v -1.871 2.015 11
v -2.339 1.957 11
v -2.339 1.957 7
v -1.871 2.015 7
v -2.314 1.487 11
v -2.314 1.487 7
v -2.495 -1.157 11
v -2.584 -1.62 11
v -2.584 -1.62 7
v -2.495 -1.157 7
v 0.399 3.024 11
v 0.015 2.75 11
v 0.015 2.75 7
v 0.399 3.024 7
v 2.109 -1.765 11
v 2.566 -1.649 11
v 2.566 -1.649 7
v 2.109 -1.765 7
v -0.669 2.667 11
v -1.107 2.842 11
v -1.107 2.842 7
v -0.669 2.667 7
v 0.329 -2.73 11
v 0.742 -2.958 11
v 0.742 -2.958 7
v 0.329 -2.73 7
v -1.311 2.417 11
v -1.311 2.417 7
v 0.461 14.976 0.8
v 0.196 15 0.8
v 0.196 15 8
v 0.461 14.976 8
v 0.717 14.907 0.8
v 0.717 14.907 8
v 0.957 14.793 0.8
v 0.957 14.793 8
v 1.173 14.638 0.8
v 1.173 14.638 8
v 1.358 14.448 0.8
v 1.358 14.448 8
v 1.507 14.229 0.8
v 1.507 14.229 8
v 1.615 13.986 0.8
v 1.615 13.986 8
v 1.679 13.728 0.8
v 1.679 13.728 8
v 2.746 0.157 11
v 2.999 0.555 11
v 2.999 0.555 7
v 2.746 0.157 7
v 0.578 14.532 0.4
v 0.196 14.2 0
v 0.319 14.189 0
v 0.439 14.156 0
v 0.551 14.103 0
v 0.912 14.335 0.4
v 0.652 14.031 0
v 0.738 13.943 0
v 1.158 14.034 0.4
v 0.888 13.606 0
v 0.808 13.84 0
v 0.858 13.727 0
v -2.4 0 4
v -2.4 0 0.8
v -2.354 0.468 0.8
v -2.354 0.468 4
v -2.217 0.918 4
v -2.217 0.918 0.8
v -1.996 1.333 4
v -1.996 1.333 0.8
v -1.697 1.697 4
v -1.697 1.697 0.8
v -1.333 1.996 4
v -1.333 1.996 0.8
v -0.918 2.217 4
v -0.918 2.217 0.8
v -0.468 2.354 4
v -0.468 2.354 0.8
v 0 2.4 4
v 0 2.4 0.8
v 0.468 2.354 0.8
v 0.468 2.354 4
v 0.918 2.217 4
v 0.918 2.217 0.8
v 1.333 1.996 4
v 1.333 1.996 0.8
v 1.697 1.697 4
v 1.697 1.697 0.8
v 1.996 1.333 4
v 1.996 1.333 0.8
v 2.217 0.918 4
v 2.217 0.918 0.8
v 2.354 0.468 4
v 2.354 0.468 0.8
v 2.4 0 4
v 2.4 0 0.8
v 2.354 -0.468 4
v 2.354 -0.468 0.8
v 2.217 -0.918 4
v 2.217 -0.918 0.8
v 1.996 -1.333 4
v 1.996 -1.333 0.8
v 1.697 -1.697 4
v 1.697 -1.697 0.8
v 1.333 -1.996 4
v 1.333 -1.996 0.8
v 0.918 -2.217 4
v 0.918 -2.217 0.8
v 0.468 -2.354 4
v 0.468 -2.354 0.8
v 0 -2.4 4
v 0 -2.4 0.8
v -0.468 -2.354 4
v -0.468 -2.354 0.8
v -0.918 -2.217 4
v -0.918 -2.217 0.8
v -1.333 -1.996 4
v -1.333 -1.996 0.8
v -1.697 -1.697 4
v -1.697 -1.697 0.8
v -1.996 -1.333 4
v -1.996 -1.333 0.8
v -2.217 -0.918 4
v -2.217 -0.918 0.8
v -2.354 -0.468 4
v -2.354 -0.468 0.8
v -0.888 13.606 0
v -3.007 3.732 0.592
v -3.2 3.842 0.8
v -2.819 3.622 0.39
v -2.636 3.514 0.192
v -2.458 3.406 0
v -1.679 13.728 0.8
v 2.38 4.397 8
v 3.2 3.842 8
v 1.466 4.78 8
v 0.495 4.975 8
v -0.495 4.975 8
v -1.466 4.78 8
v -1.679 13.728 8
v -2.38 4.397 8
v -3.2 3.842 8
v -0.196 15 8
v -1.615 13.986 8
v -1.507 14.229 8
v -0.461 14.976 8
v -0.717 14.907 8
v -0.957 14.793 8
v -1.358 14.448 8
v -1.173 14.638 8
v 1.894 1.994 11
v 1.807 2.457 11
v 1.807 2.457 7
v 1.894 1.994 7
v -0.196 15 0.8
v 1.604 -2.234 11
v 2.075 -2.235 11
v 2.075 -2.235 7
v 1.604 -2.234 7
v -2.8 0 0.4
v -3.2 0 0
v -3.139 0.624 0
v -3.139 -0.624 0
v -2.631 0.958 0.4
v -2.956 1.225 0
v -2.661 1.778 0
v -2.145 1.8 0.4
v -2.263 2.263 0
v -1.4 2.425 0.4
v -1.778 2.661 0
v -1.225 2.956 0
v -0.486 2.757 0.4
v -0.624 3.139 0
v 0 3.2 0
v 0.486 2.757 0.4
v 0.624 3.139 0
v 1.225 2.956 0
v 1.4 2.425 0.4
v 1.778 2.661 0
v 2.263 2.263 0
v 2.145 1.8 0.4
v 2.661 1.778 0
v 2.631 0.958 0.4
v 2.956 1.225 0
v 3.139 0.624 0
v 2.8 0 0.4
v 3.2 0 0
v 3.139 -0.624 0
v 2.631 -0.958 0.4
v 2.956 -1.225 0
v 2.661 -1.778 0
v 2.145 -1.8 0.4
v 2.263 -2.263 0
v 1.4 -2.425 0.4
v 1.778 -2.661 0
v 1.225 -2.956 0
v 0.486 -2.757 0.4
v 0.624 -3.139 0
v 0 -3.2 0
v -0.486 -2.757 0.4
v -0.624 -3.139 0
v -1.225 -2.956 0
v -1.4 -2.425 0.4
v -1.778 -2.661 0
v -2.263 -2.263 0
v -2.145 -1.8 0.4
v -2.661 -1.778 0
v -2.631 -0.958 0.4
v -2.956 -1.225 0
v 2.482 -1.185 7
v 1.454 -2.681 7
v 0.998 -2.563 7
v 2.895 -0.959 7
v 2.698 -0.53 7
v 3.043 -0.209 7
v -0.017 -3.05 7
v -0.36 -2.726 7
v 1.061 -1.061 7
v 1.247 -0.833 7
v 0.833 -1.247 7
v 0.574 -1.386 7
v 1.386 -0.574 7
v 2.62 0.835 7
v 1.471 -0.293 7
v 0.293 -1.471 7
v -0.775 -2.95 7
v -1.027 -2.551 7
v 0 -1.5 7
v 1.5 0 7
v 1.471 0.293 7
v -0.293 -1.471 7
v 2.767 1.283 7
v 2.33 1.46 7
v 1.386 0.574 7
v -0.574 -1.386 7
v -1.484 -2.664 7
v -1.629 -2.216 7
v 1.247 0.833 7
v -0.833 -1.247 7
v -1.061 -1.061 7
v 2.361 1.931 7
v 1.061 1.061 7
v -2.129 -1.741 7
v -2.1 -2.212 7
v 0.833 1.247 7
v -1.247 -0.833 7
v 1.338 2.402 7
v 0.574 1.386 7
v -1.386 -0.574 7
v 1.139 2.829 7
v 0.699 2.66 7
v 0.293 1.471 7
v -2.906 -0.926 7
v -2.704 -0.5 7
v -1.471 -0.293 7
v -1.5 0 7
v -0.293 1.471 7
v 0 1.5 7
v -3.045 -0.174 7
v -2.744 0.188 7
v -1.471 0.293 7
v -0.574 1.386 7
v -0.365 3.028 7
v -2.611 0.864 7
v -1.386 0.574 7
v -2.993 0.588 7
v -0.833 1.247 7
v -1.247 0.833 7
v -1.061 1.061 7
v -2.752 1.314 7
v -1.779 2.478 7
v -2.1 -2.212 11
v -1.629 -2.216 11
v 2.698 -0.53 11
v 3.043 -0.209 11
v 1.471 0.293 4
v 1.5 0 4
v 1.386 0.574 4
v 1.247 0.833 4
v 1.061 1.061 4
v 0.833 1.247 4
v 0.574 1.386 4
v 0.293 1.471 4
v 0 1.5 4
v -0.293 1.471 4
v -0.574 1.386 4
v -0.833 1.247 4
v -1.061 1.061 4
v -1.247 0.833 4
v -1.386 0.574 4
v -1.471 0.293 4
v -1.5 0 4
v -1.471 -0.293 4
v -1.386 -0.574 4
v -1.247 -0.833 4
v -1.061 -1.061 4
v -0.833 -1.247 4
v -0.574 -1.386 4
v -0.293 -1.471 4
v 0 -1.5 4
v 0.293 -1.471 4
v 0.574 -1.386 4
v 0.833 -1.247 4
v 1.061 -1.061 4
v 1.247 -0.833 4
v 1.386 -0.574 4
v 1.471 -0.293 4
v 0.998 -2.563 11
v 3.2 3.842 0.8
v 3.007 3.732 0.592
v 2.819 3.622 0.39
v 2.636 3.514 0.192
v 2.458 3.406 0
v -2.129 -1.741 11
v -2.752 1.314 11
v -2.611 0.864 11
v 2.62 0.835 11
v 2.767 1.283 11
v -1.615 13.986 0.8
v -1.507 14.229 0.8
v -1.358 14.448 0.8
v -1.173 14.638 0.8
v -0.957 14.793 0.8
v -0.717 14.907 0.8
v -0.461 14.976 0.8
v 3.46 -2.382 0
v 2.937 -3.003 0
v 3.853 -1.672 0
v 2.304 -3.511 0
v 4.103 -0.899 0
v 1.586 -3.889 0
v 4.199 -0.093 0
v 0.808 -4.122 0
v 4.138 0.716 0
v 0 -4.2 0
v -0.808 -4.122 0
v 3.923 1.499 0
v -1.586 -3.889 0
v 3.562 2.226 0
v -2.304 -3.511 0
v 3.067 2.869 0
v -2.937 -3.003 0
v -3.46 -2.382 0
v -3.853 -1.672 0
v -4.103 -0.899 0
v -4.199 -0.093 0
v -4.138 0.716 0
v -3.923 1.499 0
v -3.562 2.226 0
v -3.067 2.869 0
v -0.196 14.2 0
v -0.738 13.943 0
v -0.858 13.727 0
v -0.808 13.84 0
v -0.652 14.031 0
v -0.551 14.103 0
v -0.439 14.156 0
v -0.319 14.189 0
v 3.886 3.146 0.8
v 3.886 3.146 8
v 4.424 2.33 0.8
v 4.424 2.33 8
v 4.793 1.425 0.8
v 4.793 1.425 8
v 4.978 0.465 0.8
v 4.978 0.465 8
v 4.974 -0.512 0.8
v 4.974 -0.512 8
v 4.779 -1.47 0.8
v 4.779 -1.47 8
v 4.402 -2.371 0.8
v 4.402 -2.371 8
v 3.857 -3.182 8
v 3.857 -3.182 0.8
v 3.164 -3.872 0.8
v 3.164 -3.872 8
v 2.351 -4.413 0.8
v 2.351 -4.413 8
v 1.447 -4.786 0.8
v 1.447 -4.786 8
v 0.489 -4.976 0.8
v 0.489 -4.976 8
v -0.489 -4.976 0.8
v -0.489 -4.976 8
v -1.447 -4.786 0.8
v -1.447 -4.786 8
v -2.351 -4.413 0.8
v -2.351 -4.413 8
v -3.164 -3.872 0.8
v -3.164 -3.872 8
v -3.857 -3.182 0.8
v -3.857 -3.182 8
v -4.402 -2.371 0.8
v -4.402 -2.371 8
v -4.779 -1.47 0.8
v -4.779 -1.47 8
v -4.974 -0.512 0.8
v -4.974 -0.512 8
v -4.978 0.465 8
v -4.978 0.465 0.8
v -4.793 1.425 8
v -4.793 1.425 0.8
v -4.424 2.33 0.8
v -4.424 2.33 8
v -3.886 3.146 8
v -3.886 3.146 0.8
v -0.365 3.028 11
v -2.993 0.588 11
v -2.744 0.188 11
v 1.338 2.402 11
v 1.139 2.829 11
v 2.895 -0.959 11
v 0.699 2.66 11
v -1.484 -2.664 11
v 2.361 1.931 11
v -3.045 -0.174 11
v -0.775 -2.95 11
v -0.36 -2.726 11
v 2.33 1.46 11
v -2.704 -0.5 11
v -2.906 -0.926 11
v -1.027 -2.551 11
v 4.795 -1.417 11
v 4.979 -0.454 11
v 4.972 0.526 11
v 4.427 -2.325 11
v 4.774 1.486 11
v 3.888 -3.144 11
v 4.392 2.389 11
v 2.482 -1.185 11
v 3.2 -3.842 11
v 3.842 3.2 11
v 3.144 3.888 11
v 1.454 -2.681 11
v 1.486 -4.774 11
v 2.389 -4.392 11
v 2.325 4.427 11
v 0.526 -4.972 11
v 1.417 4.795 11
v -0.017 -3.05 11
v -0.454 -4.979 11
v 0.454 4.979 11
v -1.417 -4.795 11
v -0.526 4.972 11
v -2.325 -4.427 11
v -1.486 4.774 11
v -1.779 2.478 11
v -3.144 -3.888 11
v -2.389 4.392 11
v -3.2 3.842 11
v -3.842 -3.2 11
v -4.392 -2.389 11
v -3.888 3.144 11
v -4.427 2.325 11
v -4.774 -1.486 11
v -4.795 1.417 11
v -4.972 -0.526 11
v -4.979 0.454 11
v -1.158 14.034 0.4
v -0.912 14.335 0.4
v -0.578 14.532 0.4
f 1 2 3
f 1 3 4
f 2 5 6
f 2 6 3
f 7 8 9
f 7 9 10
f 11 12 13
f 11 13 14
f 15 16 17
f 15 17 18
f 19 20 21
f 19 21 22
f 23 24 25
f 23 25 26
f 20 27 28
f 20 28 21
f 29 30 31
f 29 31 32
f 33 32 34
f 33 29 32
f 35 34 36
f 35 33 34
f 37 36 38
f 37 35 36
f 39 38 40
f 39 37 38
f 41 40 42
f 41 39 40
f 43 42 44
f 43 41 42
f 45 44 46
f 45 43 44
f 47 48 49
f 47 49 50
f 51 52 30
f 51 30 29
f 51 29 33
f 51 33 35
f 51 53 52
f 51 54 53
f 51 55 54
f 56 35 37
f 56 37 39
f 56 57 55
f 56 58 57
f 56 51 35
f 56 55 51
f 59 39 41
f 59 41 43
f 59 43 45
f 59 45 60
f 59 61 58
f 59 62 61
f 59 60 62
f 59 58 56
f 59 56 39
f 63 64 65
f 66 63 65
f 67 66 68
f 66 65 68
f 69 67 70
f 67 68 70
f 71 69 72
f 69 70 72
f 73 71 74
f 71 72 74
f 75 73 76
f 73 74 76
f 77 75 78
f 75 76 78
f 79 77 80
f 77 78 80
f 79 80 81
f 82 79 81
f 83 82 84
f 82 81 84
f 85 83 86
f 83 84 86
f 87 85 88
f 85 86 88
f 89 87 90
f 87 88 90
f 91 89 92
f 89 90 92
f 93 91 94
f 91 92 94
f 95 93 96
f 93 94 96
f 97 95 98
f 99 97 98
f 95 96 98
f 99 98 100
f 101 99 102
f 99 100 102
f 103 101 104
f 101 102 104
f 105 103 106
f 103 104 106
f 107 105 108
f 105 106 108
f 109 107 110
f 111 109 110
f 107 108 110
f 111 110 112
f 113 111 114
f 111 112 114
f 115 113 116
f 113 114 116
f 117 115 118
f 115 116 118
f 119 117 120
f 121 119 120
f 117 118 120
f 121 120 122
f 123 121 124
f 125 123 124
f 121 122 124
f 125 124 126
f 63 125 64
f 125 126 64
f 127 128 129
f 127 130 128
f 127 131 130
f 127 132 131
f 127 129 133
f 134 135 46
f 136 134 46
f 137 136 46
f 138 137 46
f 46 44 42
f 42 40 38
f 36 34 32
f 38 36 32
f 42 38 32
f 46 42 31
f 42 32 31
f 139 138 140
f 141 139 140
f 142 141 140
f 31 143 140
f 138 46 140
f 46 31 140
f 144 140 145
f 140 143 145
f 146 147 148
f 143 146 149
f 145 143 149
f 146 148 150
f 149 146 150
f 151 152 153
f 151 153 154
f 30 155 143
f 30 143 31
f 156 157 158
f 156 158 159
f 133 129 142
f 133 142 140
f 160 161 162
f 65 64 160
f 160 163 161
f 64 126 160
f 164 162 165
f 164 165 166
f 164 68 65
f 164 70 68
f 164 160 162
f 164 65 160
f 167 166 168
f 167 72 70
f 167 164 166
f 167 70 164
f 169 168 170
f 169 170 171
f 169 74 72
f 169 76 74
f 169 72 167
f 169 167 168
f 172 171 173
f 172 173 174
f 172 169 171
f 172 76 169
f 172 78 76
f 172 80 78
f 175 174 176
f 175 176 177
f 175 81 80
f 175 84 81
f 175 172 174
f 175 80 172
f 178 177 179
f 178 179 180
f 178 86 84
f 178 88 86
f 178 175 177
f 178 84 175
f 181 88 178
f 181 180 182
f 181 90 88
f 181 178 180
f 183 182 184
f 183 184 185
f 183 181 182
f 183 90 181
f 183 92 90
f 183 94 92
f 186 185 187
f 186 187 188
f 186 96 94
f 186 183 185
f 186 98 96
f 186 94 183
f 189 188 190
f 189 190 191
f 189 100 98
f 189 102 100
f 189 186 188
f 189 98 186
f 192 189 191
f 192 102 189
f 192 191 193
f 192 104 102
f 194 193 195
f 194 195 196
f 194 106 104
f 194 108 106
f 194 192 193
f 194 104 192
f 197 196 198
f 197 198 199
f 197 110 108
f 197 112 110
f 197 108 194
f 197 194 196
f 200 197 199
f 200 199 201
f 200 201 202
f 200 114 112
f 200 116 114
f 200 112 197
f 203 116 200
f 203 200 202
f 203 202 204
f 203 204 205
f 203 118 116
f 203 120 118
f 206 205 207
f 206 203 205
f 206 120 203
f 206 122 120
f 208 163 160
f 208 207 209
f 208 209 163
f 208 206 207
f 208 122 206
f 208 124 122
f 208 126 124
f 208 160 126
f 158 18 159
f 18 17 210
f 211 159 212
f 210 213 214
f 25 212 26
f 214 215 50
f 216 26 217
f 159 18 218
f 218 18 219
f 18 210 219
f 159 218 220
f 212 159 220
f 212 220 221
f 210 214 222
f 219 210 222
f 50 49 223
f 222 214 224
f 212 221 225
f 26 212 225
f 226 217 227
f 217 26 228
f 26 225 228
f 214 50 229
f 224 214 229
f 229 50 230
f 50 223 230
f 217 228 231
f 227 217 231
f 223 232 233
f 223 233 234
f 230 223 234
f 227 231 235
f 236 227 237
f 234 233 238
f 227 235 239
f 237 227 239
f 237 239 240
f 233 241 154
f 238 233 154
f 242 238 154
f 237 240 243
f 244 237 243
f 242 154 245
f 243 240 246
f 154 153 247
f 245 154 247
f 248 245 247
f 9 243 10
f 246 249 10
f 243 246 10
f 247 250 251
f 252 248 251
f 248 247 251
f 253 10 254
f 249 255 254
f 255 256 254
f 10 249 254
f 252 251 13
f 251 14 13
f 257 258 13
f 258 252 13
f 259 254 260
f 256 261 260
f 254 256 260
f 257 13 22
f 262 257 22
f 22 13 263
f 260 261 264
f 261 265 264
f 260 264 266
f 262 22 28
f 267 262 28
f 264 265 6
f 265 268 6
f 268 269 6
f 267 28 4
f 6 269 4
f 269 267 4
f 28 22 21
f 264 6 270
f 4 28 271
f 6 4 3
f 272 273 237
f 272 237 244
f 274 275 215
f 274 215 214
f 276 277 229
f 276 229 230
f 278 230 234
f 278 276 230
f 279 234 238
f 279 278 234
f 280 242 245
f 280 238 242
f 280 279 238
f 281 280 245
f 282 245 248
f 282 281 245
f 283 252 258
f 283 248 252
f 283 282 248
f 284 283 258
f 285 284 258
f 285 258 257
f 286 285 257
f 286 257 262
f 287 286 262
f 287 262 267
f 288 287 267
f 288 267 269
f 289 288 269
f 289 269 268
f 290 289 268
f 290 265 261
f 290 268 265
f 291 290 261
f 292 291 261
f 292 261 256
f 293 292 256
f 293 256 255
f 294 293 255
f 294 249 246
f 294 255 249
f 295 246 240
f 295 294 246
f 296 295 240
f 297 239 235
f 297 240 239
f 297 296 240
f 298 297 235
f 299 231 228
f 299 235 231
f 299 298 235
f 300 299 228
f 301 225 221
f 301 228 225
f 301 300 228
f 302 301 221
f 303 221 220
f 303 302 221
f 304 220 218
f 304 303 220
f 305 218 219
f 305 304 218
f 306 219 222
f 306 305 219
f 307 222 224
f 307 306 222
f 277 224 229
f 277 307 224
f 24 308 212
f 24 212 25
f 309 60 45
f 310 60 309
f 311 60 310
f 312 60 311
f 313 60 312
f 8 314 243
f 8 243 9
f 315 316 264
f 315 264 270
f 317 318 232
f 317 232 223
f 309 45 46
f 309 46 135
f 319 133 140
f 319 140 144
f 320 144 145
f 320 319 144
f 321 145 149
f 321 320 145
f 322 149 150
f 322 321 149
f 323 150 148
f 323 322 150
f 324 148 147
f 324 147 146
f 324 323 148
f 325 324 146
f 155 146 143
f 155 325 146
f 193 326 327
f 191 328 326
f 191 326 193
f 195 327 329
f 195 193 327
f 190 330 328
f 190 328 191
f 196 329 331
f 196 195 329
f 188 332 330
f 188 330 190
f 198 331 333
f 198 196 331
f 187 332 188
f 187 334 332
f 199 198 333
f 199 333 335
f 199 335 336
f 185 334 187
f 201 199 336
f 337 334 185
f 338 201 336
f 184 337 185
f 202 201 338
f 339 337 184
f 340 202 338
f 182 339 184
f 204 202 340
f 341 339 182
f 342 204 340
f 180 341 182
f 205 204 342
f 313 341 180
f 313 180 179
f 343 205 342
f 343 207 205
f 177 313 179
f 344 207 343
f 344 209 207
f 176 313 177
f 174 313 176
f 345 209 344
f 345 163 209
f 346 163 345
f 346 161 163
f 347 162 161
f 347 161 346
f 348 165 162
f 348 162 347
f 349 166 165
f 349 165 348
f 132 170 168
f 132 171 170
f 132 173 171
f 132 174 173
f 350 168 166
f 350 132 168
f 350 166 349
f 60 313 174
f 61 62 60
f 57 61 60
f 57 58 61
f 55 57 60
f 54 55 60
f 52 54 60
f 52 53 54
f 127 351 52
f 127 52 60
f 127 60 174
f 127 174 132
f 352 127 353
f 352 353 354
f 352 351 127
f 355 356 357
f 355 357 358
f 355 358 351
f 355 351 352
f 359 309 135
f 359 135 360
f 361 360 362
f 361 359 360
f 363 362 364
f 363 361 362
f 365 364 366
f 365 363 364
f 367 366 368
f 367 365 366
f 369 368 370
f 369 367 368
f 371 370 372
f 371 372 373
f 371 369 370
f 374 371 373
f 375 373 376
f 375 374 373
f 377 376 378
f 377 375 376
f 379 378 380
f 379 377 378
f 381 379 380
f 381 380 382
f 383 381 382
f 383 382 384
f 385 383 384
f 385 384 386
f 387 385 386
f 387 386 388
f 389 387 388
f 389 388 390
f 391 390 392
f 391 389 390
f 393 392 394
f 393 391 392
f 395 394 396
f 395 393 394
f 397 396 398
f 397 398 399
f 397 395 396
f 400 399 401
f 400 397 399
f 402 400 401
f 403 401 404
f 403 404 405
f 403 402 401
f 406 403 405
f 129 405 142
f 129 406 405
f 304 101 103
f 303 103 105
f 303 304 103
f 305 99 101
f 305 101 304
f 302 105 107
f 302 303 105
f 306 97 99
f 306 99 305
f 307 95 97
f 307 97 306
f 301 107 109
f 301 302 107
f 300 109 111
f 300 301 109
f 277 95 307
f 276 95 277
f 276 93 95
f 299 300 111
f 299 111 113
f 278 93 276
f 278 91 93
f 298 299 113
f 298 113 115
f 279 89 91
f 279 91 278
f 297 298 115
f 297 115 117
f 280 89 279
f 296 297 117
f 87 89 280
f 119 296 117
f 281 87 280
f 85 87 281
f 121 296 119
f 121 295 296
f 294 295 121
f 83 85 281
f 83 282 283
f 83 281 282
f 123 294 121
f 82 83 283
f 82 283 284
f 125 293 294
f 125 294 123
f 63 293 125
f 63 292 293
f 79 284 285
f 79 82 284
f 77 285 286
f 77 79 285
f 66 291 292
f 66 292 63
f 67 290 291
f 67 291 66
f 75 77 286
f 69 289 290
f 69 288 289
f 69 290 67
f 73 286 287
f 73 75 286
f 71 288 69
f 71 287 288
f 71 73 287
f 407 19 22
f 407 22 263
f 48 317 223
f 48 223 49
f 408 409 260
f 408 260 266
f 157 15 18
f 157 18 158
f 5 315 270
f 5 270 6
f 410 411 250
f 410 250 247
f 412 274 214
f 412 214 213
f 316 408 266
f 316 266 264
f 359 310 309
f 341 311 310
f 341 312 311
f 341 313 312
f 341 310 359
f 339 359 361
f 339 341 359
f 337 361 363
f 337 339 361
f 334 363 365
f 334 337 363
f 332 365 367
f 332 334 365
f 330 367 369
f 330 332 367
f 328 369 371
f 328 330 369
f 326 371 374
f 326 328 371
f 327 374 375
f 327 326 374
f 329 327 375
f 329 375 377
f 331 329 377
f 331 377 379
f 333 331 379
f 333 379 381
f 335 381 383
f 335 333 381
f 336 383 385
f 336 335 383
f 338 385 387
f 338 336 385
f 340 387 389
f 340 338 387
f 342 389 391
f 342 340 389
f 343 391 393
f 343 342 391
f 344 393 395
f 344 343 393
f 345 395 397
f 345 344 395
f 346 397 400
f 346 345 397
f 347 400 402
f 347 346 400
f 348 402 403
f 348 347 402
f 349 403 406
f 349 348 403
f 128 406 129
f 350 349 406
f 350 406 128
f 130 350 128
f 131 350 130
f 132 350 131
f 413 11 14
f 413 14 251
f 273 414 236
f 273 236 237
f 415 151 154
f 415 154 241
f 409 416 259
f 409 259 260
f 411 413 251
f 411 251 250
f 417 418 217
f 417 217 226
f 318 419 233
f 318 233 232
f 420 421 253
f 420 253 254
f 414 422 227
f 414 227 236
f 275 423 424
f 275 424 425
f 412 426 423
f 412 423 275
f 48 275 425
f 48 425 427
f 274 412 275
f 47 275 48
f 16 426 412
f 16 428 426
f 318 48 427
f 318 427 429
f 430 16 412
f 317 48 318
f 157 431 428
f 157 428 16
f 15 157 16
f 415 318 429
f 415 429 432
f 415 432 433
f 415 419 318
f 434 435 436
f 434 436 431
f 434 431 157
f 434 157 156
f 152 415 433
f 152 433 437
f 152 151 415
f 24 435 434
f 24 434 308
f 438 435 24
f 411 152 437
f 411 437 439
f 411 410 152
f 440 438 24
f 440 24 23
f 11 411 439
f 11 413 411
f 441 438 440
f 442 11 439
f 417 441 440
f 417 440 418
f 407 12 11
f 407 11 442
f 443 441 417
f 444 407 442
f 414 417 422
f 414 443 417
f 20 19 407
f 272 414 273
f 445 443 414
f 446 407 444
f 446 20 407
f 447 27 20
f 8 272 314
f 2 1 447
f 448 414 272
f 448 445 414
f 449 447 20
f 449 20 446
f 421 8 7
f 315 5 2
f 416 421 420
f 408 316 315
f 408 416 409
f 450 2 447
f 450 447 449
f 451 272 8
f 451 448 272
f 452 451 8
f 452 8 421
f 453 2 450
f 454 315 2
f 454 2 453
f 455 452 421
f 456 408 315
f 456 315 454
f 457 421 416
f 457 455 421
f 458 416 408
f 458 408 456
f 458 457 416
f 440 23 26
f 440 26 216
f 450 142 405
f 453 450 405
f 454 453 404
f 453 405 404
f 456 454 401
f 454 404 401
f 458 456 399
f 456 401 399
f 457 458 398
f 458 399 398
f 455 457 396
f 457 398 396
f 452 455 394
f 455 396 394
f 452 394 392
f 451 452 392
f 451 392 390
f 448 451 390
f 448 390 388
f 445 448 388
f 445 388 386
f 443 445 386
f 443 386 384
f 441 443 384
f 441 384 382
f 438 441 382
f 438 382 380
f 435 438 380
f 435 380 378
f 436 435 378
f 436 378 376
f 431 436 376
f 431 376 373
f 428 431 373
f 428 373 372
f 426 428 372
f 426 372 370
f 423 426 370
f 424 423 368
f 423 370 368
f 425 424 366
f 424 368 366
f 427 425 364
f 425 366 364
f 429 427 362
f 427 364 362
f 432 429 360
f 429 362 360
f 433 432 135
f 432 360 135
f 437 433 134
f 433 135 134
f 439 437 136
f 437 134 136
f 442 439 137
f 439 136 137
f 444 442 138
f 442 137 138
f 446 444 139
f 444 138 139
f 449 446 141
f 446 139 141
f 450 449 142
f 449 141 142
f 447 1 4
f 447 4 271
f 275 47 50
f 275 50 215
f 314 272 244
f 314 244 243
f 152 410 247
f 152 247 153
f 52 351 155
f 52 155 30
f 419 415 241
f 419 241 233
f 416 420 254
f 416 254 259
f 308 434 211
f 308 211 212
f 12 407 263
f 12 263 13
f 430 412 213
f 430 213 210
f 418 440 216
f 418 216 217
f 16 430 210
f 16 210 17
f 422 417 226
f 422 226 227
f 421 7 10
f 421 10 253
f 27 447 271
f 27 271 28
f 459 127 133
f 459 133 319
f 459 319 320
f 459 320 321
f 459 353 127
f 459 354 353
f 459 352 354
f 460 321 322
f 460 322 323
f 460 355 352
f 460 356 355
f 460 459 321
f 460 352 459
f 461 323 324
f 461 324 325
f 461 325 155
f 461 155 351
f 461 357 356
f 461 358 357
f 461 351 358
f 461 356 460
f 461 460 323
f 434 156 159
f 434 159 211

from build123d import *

# Parameters (mm, degrees)
SKETCH1_R           = 1.5
BOSS_EXTRUDE3_DEPTH = 8
SKETCH2_R           = 5
BOSS_EXTRUDE4_DEPTH = 3
CUT_EXTRUDE1_DEPTH  = 4
SKETCH5_R           = 2.4
CUT_EXTRUDE2_DEPTH  = 4
CHAMFER1_SIZE       = 0.8


with BuildPart() as part:
    # Sketch1 → Boss-Extrude3 (new body)
    with BuildSketch(Plane.XY):
        with BuildLine():
            Line((-3.2, 3.841874542), (-1.678558667, 13.728155368))
            ThreePointArc((-1.678558667, 13.728155368), (-1.172681412, 14.638471135), (-0.196011829, 15))
            Line((-0.196011829, 15), (0.196011829, 15))
            ThreePointArc((0.196011829, 15), (1.172681412, 14.638471135), (1.678558667, 13.728155368))
            Line((1.678558667, 13.728155368), (3.2, 3.841874542))
            ThreePointArc((3.2, 3.841874542), (0, -5), (-3.2, 3.841874542))
        make_face()
        Circle(SKETCH1_R, mode=Mode.SUBTRACT)
    extrude(amount=BOSS_EXTRUDE3_DEPTH)

    # Sketch2 → Boss-Extrude4 (add)
    with BuildSketch(Plane.XY.offset(8)):
        with Locations(Location((0, 0, 0), (0, 0, 129.7918195))):
            Circle(SKETCH2_R)
    extrude(amount=BOSS_EXTRUDE4_DEPTH)

    # Sketch4 → Cut-Extrude1 (cut)
    with BuildSketch(Plane.XY.offset(11)):
        Polygon((-2.992716352, 0.588344146), (-2.610587457, 0.864484315), (-2.752379426, 1.314118525), (-2.313582545, 1.48655165), (-2.339100377, 1.957322004), (-1.871206732, 2.015213479), (-1.778847049, 2.477539743), (-1.311256119, 2.417252033), (-1.106822219, 2.842084548), (-0.668914462, 2.667405751), (-0.365251678, 3.028050728), (0.015457551, 2.749956557), (0.399268969, 3.023753345), (0.69885831, 2.659717478), (1.138702078, 2.829462418), (1.33834723, 2.402358568), (1.806586348, 2.457385962), (1.893742872, 1.994050635), (2.360956154, 1.930902908), (2.330147685, 1.460449166), (2.766978401, 1.283094123), (2.620140749, 0.835082305), (2.999141219, 0.554663816), (2.745500733, 0.157244152), (3.042856964, -0.208618059), (2.698350809, -0.53047423), (2.895378816, -0.958791695), (2.48165358, -1.184860965), (2.565973368, -1.648720921), (2.10902493, -1.764798528), (2.075338376, -2.235054949), (1.603878487, -2.233847309), (1.454302241, -2.680952254), (0.99795446, -2.562535248), (0.741886949, -2.95839547), (0.329325284, -2.730209673), (-0.01714383, -3.049951818), (-0.359996611, -2.726334983), (-0.775097398, -2.949868476), (-1.026698595, -2.55115464), (-1.484348746, -2.664434049), (-1.62888933, -2.215675868), (-2.100333004, -2.211583431), (-2.128730958, -1.740978032), (-2.584345614, -1.619770893), (-2.494816591, -1.156888144), (-2.905974285, -0.926182193), (-2.704143722, -0.500106719), (-3.045009904, -0.174398059), (-2.743559558, 0.18809825), align=None)
    extrude(amount=-CUT_EXTRUDE1_DEPTH, mode=Mode.SUBTRACT)

    # Sketch5 → Cut-Extrude2 (cut)
    with BuildSketch(Plane(origin=(0, 0, 0), x_dir=(-1, 0, 0), z_dir=(0, 0, -1))):
        Circle(SKETCH5_R)
    extrude(amount=-CUT_EXTRUDE2_DEPTH, mode=Mode.SUBTRACT)

    # Chamfer1
    chamfer1_edges = [part.edges().sort_by_distance(p)[0] for p in [
        (2.4, 0, 0),
        (-2.439279334, 8.785014955, 0),
        (-1.172681412, 14.638471135, 0),
        (0, 15, 0),
        (1.172681412, 14.638471135, 0),
        (2.439279334, 8.785014955, 0),
        (0, -5, 0),
    ]]
    chamfer(chamfer1_edges, length=CHAMFER1_SIZE)


solid = part.part
